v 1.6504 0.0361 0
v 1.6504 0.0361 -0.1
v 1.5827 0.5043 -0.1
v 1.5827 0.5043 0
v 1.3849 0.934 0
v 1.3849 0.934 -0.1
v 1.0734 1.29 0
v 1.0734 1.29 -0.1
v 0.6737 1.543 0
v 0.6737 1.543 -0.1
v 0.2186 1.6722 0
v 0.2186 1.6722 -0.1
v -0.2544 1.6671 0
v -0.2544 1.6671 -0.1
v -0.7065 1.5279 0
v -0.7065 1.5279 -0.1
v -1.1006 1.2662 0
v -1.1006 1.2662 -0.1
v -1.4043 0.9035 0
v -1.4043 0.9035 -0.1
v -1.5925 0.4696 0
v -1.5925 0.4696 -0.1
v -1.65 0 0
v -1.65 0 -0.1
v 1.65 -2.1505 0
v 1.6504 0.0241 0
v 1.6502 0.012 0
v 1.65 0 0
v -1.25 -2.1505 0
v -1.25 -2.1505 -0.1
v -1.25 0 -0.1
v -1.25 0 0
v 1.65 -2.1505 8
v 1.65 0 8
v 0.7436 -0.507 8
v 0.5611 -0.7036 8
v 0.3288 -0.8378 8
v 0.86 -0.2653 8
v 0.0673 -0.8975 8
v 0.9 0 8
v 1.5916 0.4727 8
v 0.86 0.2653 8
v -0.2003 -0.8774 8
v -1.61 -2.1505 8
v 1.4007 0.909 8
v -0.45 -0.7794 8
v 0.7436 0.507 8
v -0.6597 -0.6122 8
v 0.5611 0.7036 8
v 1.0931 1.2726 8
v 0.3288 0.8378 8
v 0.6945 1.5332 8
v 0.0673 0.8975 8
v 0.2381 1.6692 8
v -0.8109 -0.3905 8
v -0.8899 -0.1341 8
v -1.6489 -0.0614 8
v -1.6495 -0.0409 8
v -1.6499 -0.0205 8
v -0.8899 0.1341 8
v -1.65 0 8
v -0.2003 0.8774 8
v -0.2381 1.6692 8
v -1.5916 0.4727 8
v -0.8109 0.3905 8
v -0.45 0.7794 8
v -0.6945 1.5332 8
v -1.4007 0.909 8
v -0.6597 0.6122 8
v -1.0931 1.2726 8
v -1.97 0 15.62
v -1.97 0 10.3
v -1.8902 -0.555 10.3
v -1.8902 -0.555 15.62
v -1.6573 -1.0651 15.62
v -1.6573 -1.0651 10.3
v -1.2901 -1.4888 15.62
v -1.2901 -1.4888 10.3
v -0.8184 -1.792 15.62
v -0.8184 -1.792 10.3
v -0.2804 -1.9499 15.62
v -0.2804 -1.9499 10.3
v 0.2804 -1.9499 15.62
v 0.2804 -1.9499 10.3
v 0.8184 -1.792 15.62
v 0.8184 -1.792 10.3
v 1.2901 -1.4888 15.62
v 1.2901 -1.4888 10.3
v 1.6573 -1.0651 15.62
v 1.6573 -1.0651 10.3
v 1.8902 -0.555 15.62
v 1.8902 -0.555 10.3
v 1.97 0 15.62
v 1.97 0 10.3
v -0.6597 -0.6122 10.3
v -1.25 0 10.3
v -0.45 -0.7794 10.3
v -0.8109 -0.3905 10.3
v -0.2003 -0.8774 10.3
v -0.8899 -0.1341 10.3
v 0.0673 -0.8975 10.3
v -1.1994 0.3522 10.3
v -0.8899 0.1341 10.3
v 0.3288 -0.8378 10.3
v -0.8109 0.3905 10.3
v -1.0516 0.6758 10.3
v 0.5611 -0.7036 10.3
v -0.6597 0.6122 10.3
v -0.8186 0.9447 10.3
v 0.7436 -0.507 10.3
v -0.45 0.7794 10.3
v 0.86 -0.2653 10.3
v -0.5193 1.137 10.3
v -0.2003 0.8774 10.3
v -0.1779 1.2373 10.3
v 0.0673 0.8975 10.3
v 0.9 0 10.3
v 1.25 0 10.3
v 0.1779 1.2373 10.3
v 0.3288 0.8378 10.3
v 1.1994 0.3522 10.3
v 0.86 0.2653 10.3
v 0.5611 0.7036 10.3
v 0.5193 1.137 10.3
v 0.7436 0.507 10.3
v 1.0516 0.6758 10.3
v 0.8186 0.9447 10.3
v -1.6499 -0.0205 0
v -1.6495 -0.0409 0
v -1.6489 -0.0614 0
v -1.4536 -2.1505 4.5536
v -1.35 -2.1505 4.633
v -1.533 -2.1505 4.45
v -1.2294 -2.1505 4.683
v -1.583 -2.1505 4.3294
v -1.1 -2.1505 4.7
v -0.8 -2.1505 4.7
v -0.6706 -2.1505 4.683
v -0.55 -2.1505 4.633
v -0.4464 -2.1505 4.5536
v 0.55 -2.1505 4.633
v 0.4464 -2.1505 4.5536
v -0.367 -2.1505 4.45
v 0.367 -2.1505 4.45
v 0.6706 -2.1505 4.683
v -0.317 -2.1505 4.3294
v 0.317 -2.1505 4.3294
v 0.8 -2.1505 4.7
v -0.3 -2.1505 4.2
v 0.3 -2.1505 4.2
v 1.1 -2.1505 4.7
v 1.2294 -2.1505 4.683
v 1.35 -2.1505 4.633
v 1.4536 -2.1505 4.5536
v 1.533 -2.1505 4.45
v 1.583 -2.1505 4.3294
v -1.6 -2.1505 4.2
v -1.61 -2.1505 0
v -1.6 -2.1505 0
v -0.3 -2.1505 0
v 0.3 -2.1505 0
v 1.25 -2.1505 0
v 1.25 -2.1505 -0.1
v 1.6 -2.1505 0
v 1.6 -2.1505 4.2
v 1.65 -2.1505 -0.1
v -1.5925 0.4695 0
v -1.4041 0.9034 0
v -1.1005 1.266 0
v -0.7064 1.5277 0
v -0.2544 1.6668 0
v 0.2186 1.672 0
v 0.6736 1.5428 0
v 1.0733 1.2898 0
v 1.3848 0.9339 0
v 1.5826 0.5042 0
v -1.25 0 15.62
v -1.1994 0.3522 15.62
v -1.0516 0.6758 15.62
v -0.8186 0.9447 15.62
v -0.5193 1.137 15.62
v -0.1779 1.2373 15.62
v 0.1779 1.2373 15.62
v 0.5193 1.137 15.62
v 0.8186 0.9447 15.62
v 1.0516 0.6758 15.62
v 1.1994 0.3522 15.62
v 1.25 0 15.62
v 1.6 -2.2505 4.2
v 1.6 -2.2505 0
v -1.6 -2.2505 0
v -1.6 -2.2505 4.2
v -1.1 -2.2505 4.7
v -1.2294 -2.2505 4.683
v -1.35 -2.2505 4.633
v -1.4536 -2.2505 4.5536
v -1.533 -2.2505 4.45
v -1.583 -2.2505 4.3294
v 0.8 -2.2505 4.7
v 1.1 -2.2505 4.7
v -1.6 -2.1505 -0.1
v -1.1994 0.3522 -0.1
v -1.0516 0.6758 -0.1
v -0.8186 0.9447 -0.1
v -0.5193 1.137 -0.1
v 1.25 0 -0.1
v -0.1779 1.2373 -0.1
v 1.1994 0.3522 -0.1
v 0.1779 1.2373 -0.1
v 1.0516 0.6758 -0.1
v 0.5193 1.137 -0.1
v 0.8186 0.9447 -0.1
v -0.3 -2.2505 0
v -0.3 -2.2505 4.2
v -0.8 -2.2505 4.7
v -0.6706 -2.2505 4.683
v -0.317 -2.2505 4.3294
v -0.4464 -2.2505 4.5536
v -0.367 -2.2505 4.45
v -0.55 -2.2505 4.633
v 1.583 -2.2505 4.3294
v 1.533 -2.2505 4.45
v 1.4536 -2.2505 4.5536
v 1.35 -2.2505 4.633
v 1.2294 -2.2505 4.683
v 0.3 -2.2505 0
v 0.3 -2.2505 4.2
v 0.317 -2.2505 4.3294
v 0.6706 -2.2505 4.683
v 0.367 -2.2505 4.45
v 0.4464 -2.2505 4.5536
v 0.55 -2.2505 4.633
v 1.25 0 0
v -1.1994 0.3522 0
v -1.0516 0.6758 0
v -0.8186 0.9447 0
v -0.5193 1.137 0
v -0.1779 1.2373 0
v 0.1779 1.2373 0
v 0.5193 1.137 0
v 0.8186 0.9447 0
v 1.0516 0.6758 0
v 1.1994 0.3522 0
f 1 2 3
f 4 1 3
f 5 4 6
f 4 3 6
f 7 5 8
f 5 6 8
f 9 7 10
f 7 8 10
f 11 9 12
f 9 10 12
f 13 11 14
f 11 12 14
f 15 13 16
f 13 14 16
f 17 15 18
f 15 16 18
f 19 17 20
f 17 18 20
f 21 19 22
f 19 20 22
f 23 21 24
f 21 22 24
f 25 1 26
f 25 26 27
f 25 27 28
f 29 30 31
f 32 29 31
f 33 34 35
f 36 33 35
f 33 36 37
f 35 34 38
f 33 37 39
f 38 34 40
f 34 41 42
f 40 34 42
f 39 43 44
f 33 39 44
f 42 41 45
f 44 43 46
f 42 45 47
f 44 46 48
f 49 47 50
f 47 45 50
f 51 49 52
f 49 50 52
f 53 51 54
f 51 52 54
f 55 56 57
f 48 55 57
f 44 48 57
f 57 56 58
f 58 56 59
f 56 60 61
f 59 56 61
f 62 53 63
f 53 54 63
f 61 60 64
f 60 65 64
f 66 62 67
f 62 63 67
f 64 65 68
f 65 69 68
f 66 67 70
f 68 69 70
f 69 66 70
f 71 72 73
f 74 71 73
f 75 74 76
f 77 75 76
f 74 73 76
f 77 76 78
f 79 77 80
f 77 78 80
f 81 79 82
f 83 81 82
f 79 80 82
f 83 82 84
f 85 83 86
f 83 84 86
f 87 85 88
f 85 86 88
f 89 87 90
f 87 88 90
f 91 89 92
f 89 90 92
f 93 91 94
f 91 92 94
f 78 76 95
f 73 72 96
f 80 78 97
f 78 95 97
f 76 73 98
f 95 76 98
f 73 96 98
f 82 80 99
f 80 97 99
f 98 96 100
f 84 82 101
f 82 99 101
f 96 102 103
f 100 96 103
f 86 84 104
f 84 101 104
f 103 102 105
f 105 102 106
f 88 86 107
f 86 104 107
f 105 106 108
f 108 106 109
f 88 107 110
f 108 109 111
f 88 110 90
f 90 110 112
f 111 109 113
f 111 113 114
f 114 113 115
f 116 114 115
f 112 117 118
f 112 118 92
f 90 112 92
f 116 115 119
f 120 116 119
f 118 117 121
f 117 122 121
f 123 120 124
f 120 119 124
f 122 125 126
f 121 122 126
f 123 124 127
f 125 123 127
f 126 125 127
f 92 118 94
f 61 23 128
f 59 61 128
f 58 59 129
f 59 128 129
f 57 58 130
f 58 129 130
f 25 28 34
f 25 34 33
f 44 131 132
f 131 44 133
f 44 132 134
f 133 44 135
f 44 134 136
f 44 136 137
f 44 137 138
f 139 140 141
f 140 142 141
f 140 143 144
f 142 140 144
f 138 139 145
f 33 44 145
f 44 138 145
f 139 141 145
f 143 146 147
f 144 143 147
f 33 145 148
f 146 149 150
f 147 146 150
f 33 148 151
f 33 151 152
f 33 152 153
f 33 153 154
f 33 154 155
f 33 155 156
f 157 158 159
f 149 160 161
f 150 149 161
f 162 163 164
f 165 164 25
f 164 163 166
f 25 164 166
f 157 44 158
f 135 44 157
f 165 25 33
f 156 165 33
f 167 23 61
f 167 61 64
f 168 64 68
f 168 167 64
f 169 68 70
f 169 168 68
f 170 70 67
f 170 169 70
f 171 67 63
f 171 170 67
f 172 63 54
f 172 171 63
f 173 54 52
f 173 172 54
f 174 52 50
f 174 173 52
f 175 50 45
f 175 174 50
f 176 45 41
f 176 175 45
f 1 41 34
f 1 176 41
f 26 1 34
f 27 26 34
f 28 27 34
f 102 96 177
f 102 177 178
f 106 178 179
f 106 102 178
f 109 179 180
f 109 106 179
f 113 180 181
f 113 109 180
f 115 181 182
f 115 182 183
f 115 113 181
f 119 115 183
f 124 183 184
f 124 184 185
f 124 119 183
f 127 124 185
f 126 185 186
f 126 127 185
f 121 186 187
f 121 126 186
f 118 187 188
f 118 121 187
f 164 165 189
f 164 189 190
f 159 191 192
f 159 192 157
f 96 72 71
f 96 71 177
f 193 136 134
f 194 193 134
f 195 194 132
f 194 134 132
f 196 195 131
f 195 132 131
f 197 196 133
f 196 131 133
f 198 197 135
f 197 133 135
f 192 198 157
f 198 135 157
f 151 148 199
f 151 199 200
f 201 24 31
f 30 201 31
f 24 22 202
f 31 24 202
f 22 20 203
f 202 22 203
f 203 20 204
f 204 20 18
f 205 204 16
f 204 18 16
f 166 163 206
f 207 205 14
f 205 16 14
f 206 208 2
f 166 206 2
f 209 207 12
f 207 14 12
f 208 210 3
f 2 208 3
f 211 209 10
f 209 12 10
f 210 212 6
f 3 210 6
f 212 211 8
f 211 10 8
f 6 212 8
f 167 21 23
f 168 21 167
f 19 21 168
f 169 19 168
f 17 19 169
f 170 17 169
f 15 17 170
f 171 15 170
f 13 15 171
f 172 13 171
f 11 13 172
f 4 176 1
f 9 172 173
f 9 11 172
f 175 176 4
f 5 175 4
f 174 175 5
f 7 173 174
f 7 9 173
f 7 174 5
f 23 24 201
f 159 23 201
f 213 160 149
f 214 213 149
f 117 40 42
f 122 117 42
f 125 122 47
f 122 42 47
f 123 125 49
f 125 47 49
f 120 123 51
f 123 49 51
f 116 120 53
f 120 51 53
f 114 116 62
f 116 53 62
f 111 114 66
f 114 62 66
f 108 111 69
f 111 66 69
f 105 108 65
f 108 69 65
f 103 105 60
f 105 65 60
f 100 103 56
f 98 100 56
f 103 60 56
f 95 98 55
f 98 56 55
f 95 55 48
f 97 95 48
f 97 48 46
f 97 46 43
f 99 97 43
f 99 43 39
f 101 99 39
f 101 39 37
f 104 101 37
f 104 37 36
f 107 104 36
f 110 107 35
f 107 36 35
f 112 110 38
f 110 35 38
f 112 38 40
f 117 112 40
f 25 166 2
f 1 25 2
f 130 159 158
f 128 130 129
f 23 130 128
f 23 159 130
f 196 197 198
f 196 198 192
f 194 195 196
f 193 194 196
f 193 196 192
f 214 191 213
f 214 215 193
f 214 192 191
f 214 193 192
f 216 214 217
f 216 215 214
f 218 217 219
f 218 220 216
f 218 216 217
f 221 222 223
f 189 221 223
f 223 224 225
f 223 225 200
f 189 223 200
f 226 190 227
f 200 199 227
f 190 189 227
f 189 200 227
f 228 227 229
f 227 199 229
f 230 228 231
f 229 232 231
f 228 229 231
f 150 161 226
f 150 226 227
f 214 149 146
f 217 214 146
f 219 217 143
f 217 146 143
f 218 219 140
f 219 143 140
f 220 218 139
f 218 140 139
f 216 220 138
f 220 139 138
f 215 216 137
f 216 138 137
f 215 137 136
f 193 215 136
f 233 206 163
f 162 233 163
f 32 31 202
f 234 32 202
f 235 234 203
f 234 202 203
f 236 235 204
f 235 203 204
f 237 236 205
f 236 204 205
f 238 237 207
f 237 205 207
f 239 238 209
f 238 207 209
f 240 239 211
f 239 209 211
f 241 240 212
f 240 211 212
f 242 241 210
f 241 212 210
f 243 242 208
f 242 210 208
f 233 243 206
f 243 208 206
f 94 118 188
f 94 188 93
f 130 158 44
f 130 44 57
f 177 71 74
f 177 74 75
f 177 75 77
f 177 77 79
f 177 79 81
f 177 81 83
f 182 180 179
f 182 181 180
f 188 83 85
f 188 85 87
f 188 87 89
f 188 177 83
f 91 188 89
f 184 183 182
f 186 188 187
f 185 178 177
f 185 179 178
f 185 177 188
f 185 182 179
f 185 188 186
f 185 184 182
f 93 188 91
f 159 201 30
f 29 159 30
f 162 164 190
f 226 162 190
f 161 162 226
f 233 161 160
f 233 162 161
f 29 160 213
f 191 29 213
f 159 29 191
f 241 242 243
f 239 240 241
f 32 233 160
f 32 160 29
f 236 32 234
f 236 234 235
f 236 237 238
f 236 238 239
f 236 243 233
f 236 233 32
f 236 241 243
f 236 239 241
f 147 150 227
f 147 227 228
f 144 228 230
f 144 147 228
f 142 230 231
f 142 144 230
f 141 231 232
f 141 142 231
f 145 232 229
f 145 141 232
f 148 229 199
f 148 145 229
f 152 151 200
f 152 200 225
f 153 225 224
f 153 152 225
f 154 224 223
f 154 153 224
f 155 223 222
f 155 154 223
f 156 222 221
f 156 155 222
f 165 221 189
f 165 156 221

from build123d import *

# Parameters (mm, degrees)
ESQUISSE1_R             = 1.65
BOSS_EXTRU_1_DEPTH      = 8
ESQUISSE2_W             = 3.2
ESQUISSE2_H             = 2.278115777
BOSS_EXTRU_2_DEPTH      = 4.2
ESQUISSE3_R             = 0.9
BOSS_EXTRU_3_DEPTH      = 2.3
ESQUISSE4_R             = 1.97
BOSS_EXTRU_4_DEPTH      = 5.32
ENL_V_START             = -5.32
ENL_V_MAT_EXTRU_2_DEPTH = 5.32
BOSS_EXTRU_5_DEPTH      = 0.1
BOSS_EXTRU_6_DEPTH      = 8
BOSS_EXTRU_7_START      = 0.1
BOSS_EXTRU_7_DEPTH      = 0.1


with BuildPart() as part:
    # Esquisse1 → Boss.-Extru.1 (new body)
    with BuildSketch(Plane.XY):
        Circle(ESQUISSE1_R)
    extrude(amount=BOSS_EXTRU_1_DEPTH)

    # Esquisse2 → Boss.-Extru.2 (add)
    with BuildSketch(Plane(origin=(0, 0, 0), x_dir=(-1, 0, 0), z_dir=(0, 0, -1))):
        with Locations((0, -1.011435459)):
            Rectangle(ESQUISSE2_W, ESQUISSE2_H)
    extrude(amount=-BOSS_EXTRU_2_DEPTH)

    # Esquisse3 → Boss.-Extru.3 (add)
    with BuildSketch(Plane.XY.offset(8)):
        Circle(ESQUISSE3_R)
    extrude(amount=BOSS_EXTRU_3_DEPTH)

    # Esquisse4 → Boss.-Extru.4 (add)
    with BuildSketch(Plane.XY.offset(10.3)):
        Circle(ESQUISSE4_R)
    extrude(amount=BOSS_EXTRU_4_DEPTH)

    # Esquisse6 → Enlèv. mat.-Extru.2 (cut)
    with BuildSketch(Plane.XY.offset(15.62).offset(ENL_V_START)):
        with BuildLine():
            Line((-1.97, 0), (-1.25, 0))
            ThreePointArc((-1.25, 0), (0, 1.25), (1.25, 0))
            Line((1.25, 0), (1.97, 0))
            ThreePointArc((1.97, 0), (0, 1.97), (-1.97, 0))
        make_face()
    extrude(amount=ENL_V_MAT_EXTRU_2_DEPTH, mode=Mode.SUBTRACT)

    # Esquisse7 → Boss.-Extru.5 (add)
    with BuildSketch(Plane.XZ.offset(2.150493347)):
        with BuildLine():
            Line((1.6, 0), (0.3, 0))
            Line((0.3, 0), (0.3, 4.2))
            ThreePointArc((0.3, 4.2), (0.446446609, 4.553553391), (0.8, 4.7))
            Line((0.8, 4.7), (1.1, 4.7))
            ThreePointArc((1.1, 4.7), (1.453553391, 4.553553391), (1.6, 4.2))
            Line((1.6, 4.2), (1.6, 0))
        make_face()
        with BuildLine():
            Line((-1.6, 0), (-0.3, 0))
            Line((-0.3, 0), (-0.3, 4.2))
            ThreePointArc((-0.3, 4.2), (-0.446446609, 4.553553391), (-0.8, 4.7))
            Line((-0.8, 4.7), (-1.1, 4.7))
            ThreePointArc((-1.1, 4.7), (-1.453553391, 4.553553391), (-1.6, 4.2))
            Line((-1.6, 4.2), (-1.6, 0))
        make_face()
    extrude(amount=BOSS_EXTRU_5_DEPTH)

    # Esquisse8 → Boss.-Extru.6 (add)
    with BuildSketch(Plane(origin=(0, 0, 0), x_dir=(-1, 0, 0), z_dir=(0, 0, -1))):
        with BuildLine():
            Line((-1.65, 0), (-1.65, -2.150493347))
            Line((-1.65, -2.150493347), (1.6, -2.150493347))
            Line((1.6, -2.150493347), (1.61, -2.150493347))
            Line((1.61, -2.150493347), (1.65, 0))
            ThreePointArc((1.65, 0), (0, 1.686495035), (-1.65, 0))
        make_face()
    extrude(amount=-BOSS_EXTRU_6_DEPTH)

    # Esquisse9 → Boss.-Extru.7 (add)
    with BuildSketch(Plane(origin=(0, 0, 0), x_dir=(-1, 0, 0), z_dir=(0, 0, -1)).offset(BOSS_EXTRU_7_START)):
        with BuildLine():
            Line((-1.25, 0), (-1.25, -2.150493347))
            Line((-1.25, -2.150493347), (-1.65, -2.150493347))
            Line((-1.65, -2.150493347), (-1.650394869, 0.036100167))
            ThreePointArc((-1.650394869, 0.036100167), (0.018054459, 1.686697641), (1.65, 0))
            Line((1.65, 0), (1.6, -2.150493347))
            Line((1.6, -2.150493347), (1.25, -2.150493347))
            Line((1.25, -2.150493347), (1.25, 0))
            ThreePointArc((1.25, 0), (0, 1.25), (-1.25, 0))
        make_face()
    extrude(amount=-BOSS_EXTRU_7_DEPTH)


solid = part.part
